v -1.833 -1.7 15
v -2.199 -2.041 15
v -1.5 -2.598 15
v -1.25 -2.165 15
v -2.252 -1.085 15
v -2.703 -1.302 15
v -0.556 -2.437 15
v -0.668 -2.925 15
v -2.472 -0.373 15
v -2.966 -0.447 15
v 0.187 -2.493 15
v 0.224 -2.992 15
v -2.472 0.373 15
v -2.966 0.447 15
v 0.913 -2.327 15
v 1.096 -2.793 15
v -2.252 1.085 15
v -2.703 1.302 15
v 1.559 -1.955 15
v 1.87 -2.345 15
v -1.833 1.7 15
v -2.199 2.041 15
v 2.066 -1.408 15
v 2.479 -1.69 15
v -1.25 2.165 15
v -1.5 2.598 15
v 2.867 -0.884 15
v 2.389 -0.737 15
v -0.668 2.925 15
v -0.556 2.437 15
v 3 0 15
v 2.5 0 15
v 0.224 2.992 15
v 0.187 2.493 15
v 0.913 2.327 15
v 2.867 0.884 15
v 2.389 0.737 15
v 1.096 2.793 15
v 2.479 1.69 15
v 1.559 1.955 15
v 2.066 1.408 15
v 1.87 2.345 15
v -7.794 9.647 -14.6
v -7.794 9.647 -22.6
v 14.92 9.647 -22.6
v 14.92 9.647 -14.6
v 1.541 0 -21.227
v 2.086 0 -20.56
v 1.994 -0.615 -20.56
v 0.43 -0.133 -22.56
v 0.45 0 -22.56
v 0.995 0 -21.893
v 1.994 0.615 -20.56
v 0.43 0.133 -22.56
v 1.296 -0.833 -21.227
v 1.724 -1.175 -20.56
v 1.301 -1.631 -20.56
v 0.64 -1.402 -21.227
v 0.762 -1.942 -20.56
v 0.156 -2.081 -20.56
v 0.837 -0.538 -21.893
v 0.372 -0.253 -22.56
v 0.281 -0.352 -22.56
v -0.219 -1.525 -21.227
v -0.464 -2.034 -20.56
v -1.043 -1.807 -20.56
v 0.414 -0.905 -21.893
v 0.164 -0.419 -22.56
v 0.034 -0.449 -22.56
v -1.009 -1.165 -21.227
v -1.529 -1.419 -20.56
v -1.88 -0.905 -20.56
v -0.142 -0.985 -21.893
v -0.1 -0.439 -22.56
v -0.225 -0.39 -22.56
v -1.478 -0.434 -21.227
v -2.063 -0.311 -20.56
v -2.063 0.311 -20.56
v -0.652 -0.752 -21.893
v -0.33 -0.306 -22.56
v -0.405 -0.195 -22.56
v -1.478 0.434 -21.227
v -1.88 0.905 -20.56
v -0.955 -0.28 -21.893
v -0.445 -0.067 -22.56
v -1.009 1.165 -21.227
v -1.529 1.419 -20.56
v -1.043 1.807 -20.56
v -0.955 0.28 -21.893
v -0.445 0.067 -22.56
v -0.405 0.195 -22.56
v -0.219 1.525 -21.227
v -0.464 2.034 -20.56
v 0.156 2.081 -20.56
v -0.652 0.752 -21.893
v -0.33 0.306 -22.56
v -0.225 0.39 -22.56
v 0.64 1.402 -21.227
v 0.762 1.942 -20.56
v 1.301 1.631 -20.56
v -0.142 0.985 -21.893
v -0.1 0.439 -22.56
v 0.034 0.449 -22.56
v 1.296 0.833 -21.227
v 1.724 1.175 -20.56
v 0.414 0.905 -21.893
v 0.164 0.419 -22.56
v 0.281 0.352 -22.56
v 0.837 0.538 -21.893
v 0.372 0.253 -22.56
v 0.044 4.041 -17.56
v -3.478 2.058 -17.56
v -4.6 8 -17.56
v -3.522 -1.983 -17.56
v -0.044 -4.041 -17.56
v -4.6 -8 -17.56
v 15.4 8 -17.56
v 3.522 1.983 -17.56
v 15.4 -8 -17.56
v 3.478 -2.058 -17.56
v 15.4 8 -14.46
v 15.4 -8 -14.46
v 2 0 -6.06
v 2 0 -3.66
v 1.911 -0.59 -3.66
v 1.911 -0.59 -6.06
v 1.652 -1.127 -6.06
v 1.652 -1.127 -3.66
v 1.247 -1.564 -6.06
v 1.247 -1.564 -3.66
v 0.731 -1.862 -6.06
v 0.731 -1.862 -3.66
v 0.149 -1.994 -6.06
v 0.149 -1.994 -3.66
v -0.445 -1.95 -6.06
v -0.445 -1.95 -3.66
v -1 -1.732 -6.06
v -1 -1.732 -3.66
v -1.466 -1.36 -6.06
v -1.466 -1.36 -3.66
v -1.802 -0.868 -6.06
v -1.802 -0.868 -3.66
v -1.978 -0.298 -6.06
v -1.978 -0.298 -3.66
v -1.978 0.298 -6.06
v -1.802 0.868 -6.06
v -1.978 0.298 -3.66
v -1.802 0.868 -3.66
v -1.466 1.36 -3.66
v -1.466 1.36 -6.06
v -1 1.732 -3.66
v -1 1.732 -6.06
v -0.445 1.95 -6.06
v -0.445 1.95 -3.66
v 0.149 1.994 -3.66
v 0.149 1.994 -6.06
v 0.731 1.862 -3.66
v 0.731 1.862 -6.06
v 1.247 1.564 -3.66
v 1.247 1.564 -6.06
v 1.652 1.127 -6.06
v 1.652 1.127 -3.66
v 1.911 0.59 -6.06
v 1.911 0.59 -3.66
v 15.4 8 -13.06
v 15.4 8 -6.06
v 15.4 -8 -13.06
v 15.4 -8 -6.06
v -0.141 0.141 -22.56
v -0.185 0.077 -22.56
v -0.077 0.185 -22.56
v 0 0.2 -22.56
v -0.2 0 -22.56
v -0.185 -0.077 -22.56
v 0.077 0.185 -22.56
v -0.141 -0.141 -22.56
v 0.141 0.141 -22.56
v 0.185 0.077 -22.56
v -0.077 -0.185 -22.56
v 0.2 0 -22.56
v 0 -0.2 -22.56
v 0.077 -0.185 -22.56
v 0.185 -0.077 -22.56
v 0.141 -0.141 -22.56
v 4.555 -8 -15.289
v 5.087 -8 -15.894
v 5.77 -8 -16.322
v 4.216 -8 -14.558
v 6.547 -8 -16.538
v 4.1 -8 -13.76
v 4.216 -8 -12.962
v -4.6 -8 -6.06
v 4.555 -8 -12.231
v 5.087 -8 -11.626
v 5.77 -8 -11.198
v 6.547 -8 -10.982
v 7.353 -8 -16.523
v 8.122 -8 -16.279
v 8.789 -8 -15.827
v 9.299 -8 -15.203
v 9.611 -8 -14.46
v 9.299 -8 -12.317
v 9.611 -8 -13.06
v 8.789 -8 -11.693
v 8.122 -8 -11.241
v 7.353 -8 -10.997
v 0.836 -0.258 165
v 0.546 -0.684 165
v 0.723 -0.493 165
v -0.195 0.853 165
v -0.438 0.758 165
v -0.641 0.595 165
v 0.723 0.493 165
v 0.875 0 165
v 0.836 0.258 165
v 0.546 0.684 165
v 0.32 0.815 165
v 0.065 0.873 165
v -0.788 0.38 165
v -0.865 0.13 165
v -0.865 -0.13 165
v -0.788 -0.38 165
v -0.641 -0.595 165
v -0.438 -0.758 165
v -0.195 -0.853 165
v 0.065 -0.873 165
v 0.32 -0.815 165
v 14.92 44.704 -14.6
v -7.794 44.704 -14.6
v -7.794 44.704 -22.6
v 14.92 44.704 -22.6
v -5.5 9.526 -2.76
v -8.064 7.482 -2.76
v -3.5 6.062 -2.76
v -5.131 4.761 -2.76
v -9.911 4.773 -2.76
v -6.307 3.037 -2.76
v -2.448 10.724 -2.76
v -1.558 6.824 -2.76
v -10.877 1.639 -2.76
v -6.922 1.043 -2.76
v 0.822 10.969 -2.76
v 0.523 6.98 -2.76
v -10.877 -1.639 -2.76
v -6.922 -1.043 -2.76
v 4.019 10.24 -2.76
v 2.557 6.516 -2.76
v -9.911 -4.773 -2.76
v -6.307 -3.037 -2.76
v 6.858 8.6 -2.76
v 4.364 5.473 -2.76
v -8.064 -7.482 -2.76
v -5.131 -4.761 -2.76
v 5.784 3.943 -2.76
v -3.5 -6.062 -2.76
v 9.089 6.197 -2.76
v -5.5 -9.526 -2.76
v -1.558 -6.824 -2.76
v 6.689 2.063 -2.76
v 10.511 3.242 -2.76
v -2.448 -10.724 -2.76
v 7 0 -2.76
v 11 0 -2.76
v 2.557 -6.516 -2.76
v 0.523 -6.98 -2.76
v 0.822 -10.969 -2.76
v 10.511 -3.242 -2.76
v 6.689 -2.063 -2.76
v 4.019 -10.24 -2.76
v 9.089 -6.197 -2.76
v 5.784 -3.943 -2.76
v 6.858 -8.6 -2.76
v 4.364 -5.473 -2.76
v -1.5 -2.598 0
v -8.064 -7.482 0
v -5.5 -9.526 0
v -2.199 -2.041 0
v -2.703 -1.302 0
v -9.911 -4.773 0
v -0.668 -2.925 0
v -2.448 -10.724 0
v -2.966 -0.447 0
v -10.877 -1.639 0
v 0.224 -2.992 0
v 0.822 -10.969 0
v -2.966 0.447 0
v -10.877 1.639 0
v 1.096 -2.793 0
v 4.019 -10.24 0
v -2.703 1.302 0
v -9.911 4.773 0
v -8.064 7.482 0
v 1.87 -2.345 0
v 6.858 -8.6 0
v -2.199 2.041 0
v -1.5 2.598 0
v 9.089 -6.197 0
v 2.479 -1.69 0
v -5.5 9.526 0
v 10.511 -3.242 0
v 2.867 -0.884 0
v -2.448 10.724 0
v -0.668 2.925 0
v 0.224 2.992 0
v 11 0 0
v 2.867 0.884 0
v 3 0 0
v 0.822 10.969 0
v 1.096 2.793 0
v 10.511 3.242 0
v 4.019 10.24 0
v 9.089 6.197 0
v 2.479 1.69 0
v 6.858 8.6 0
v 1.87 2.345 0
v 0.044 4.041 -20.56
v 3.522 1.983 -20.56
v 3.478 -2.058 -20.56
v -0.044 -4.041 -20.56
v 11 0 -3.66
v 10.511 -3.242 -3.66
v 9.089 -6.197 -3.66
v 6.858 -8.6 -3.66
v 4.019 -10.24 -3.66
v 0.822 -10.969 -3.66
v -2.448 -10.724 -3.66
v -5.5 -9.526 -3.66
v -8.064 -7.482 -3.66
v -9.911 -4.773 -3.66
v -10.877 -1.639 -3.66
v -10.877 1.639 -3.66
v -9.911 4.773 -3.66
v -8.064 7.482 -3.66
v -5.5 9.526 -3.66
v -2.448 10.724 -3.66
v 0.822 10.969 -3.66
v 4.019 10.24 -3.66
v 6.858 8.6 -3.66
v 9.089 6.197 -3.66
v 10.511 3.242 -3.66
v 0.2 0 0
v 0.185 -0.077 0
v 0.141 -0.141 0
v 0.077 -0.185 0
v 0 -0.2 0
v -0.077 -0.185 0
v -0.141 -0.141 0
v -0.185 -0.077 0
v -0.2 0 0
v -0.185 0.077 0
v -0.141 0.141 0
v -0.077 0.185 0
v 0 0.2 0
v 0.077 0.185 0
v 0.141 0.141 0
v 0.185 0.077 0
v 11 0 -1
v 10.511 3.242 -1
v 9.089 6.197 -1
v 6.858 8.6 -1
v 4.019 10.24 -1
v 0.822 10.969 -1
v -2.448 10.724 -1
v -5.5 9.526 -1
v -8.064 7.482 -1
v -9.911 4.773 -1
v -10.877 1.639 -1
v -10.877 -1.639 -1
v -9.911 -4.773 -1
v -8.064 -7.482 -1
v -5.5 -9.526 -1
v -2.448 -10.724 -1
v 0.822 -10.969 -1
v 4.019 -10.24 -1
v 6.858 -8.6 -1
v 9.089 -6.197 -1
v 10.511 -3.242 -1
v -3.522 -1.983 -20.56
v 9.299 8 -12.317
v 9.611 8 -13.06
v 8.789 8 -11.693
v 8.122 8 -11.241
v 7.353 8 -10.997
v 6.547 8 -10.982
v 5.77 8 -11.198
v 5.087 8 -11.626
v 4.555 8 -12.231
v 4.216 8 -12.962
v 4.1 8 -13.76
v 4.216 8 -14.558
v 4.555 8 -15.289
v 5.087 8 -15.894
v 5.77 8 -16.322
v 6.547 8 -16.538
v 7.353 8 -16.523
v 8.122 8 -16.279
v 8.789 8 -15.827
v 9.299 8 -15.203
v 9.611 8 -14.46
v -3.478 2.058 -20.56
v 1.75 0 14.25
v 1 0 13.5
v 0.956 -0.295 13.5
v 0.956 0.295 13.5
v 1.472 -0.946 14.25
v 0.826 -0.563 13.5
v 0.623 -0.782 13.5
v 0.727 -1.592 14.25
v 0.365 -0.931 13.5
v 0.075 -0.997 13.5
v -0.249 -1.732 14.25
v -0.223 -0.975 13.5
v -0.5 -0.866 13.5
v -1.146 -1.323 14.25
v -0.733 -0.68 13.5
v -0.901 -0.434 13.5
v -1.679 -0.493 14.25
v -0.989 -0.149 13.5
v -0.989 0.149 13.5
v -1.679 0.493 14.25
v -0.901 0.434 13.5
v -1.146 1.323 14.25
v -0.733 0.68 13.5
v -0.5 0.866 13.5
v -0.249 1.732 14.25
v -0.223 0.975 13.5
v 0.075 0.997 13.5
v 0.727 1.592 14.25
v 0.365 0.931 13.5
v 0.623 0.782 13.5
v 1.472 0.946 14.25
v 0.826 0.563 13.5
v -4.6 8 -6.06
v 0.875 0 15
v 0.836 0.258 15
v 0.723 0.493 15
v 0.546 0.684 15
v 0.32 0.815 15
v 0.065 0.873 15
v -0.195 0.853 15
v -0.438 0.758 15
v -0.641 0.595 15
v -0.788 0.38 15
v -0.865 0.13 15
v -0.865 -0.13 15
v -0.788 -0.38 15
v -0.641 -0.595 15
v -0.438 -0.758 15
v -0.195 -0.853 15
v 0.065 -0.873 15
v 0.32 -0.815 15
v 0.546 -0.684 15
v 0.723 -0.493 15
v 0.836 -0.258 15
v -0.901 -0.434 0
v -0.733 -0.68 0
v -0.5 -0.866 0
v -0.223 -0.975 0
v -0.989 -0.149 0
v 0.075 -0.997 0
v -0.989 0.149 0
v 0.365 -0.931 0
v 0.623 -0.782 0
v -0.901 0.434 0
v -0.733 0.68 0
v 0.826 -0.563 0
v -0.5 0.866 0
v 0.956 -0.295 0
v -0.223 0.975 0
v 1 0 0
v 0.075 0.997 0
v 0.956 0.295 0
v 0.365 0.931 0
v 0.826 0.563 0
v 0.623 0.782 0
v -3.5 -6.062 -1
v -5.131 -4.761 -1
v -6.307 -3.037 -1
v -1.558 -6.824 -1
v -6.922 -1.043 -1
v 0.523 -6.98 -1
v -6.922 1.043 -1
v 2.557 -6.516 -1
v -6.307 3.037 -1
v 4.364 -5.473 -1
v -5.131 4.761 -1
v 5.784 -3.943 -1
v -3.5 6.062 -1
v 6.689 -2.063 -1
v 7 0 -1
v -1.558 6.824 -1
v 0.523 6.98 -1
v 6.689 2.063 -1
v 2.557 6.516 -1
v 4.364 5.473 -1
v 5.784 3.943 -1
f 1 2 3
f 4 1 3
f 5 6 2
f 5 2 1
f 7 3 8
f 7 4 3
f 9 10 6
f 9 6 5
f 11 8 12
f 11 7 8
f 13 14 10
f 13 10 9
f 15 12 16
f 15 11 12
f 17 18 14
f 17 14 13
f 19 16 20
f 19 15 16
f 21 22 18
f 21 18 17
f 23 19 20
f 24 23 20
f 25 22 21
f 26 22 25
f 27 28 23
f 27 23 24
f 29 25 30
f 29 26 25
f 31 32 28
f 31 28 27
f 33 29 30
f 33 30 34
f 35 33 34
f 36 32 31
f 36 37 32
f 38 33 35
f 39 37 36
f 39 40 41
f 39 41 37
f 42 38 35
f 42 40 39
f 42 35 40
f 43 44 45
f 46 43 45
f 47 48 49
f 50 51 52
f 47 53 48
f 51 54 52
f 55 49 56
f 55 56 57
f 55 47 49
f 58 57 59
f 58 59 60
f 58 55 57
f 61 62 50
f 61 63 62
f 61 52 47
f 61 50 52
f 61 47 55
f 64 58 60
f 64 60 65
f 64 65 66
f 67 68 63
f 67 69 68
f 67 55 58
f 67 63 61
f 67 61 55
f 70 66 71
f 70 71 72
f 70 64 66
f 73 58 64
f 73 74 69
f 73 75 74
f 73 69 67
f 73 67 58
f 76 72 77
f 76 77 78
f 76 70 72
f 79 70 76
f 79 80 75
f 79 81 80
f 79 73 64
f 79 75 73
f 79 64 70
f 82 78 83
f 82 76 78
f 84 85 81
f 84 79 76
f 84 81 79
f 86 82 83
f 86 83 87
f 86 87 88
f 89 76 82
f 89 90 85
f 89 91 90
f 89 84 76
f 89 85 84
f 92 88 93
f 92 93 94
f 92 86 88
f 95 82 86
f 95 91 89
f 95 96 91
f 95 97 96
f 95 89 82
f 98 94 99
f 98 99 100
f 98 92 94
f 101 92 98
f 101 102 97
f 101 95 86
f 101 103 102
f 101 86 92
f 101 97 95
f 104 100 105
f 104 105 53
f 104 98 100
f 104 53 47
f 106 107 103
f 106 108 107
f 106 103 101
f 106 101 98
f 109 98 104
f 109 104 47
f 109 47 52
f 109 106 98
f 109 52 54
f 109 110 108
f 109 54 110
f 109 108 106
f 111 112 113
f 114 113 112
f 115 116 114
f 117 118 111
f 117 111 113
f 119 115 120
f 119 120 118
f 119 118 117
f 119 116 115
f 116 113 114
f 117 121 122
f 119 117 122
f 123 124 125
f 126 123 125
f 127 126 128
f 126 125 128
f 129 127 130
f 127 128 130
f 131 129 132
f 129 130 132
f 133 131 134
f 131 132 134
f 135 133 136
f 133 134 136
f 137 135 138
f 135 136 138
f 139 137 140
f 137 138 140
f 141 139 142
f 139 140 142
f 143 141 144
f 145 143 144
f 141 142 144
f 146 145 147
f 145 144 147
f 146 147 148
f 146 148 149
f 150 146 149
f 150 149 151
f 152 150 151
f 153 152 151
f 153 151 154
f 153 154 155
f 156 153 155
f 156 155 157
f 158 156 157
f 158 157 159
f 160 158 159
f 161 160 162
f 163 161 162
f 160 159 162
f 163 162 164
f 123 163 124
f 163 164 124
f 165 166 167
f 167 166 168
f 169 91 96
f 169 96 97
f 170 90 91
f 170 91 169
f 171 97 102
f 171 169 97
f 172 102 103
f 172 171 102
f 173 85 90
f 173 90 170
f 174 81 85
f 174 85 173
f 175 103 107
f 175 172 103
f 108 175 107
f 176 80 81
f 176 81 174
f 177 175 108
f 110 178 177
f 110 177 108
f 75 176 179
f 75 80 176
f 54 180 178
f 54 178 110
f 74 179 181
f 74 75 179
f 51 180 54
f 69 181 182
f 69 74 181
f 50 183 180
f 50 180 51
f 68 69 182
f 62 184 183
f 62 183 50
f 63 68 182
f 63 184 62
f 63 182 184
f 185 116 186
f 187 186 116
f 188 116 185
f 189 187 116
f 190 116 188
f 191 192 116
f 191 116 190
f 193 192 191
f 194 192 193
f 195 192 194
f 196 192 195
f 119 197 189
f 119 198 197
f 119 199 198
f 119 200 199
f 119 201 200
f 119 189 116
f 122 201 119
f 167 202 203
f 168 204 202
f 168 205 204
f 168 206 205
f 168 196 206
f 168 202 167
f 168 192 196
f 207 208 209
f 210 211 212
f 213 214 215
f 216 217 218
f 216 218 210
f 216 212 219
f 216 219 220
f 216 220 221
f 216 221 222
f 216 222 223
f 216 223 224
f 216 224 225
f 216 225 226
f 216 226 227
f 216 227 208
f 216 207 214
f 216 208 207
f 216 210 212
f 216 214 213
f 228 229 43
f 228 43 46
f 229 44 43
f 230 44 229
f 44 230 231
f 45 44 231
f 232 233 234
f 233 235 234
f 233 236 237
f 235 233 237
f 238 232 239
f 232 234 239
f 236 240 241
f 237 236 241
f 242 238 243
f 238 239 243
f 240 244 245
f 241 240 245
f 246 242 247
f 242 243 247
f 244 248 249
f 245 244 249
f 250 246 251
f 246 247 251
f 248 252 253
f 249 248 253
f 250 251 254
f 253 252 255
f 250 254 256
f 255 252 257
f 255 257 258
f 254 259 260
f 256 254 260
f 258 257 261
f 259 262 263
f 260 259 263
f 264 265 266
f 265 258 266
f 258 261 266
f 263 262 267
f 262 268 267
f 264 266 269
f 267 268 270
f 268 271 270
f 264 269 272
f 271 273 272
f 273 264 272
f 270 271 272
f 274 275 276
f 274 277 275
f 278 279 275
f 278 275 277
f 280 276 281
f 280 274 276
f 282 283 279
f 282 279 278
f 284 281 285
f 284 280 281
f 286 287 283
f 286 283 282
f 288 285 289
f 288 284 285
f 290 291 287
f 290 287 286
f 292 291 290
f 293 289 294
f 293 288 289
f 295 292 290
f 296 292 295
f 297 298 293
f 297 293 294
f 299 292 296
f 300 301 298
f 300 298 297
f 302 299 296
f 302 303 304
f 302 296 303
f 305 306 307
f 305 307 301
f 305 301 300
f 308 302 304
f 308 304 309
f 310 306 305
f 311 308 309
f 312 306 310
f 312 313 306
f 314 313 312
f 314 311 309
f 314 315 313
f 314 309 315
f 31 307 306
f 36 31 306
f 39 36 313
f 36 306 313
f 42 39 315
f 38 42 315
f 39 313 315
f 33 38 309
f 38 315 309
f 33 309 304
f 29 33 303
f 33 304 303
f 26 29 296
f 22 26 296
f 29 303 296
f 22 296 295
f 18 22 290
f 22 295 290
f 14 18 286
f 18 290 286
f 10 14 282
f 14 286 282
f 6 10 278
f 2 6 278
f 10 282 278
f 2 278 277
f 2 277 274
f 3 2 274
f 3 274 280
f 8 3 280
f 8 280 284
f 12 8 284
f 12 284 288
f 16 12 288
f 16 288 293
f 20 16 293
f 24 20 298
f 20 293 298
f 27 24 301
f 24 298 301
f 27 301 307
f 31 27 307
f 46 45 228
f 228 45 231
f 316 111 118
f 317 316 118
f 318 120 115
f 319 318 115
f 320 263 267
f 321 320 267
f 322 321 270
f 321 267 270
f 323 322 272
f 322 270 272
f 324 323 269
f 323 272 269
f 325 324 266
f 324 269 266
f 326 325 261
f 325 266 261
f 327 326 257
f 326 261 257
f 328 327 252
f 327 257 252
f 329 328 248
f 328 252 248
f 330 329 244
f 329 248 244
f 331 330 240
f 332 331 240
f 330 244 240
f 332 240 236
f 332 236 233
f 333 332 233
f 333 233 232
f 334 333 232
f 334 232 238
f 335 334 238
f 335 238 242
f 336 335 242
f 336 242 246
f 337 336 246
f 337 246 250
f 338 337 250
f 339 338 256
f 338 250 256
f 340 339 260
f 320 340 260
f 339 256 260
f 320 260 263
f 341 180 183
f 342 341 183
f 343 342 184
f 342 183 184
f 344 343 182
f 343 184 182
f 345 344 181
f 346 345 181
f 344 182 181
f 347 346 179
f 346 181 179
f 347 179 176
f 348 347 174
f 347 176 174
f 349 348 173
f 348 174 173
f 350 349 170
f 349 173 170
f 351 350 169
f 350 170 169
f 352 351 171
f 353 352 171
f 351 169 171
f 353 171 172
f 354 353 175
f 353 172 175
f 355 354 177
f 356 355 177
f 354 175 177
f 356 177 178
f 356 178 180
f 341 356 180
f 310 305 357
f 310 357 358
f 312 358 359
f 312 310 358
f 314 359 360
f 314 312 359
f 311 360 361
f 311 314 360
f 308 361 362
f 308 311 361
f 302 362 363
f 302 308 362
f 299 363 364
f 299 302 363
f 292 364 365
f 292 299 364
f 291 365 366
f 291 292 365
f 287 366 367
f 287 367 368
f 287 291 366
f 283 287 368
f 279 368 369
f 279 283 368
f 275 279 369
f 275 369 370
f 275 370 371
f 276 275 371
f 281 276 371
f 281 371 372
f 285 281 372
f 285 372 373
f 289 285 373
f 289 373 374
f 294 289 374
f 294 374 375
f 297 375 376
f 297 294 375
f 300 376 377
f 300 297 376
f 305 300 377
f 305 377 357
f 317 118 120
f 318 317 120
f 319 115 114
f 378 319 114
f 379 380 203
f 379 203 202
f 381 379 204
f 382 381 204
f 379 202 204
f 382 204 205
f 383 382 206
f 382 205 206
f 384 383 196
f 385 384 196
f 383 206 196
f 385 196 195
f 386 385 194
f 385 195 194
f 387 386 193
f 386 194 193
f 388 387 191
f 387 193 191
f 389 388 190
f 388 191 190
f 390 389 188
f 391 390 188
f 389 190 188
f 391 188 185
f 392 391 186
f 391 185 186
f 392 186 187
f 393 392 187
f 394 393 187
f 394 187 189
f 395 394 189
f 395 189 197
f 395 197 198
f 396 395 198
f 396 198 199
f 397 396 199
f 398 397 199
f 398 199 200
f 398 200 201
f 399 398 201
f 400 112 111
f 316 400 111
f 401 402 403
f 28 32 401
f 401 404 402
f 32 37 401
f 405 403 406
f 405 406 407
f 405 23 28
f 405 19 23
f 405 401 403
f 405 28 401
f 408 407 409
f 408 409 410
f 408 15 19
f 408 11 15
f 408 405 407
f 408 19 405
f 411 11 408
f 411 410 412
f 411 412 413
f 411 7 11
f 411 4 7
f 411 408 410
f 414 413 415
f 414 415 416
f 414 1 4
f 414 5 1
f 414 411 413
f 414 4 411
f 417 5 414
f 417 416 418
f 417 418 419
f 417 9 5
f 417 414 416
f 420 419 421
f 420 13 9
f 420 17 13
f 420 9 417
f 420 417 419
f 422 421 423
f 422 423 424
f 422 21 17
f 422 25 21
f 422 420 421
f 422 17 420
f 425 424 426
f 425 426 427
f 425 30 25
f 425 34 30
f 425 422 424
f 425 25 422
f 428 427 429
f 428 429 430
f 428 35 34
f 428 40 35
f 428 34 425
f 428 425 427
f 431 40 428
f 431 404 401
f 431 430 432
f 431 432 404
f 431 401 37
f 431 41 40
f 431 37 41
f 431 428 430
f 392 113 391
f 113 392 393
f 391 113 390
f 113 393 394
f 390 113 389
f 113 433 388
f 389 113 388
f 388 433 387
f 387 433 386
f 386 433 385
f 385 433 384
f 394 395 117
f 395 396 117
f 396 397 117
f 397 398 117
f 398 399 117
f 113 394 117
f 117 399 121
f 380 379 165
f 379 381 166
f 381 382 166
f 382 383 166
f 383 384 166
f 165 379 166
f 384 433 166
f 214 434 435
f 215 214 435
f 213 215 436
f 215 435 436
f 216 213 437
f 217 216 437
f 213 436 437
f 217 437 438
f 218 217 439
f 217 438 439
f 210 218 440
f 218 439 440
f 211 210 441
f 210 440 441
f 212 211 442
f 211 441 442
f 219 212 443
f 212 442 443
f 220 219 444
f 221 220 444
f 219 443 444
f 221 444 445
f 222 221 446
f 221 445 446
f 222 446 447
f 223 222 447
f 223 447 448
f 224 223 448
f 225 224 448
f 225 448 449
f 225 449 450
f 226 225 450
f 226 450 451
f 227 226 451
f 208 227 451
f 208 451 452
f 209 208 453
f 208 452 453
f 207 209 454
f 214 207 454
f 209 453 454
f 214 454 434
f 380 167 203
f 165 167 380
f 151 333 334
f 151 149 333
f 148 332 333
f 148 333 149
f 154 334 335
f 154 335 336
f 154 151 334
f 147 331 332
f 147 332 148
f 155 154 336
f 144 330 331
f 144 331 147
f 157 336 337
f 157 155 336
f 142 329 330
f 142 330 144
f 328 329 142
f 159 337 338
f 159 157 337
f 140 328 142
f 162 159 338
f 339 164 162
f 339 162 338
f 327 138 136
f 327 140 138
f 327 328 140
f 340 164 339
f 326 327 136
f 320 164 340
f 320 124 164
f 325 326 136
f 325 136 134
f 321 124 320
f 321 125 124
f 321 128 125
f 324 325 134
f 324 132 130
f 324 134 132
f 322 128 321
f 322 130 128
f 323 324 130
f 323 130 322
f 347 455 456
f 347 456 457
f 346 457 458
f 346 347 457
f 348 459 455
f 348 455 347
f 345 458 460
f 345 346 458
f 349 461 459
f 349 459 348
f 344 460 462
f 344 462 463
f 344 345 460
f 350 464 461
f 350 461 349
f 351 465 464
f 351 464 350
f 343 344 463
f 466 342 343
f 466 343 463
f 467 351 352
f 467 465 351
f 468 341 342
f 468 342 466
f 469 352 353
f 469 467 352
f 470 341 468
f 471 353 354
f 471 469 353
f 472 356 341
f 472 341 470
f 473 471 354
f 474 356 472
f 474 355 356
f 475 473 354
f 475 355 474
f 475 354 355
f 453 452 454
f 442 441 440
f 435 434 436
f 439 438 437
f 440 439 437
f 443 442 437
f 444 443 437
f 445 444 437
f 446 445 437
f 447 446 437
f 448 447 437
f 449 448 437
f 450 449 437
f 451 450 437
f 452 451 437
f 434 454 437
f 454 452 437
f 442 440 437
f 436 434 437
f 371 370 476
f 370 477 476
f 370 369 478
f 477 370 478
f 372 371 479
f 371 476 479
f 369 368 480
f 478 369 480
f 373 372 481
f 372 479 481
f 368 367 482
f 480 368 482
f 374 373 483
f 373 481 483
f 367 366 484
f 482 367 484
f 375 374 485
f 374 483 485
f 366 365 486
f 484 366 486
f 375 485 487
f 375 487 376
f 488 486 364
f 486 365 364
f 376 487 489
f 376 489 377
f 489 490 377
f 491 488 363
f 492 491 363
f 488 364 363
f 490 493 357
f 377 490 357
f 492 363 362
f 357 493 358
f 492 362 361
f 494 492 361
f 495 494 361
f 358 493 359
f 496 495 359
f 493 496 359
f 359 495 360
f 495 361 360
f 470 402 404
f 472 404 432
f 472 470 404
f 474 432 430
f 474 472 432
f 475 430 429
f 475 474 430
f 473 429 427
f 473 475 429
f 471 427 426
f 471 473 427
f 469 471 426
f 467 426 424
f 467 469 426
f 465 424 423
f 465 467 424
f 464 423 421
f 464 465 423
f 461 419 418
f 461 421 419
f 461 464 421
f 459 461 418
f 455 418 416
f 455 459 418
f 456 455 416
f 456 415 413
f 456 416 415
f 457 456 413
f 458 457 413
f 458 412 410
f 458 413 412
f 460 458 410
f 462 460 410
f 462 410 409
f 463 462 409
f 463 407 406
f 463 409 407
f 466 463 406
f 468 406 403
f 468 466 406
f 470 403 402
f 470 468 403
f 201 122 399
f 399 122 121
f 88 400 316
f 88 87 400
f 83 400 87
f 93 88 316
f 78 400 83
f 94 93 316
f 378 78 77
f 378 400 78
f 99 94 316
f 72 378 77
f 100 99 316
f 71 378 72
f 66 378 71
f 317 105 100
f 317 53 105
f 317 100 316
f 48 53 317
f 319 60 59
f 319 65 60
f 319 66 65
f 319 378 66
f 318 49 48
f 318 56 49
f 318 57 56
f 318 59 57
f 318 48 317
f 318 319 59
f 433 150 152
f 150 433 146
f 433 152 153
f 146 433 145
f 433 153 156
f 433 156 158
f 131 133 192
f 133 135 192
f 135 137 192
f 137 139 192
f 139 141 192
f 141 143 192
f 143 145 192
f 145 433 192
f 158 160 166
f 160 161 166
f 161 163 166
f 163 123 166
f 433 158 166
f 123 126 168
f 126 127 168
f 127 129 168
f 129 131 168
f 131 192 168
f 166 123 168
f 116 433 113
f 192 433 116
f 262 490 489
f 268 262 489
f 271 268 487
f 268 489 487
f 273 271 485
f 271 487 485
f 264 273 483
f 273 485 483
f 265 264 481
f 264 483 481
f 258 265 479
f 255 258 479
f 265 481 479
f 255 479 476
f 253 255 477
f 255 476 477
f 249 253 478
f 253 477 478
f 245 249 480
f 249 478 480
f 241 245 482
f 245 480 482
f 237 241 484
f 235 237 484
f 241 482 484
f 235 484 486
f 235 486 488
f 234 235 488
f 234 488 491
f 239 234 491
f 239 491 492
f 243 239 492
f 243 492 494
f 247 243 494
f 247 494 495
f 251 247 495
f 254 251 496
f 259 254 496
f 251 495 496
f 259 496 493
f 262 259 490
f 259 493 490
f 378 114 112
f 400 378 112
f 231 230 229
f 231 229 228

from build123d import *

# Parameters (mm, degrees)
F0_R      = 11
F1_DEPTH  = 1
F2_R      = 7
F3_DEPTH  = 1.76
F4_R      = 11
F5_DEPTH  = 0.9
F6_R      = 2
F7_DEPTH  = 2.4
F8_W      = 20
F8_H      = 16
F9_DEPTH  = 11.5
F10_R     = 2.8
F11_DEPTH = 19.001
F12_W     = 16
F12_H     = 1.4
F13_DEPTH = 5.7899116577
F15_DEPTH = 3
F16_R     = 2.25
F17_DEPTH = 2
F19_R     = 3
F20_DEPTH = 15
F21_R     = 0.2
F22_DEPTH = 37.561
F23_R     = 1
F24_DEPTH = 15.001
F25_SIZE  = 1.5
F27_W     = 22.7133790031
F27_H     = 35.0576061755
F28_DEPTH = 8
F30_R     = 0.875
F31_DEPTH = 150


# Not quite as in the source:
# - a fillet or chamfer that OpenCascade refuses, or shapes differently, is made with other operations: its cross-section is extruded or revolved along the edge and cut away or added


with BuildPart() as f1:
    # F0 (on Top) → F1 (new body)
    with BuildSketch(Plane.XY):
        Circle(F0_R)
    extrude(amount=-F1_DEPTH)

    # F2 (on face) → F3 (join)
    with BuildSketch(Plane(origin=(0, 0, -1), x_dir=(1, 0, 0), z_dir=(0, 0, -1))):
        Circle(F2_R)
    extrude(amount=F3_DEPTH)

    # F4 (on face) → F5 (join)
    with BuildSketch(Plane(origin=(0, 0, -2.76), x_dir=(1, 0, 0), z_dir=(0, 0, -1))):
        Circle(F4_R)
    extrude(amount=F5_DEPTH)

    # F6 (on face) → F7 (join)
    with BuildSketch(Plane(origin=(0, 0, -3.66), x_dir=(1, 0, 0), z_dir=(0, 0, -1))):
        Circle(F6_R)
    extrude(amount=F7_DEPTH)

    # F8 (on face) → F9 (join)
    with BuildSketch(Plane(origin=(0, 0, -6.06), x_dir=(1, 0, 0), z_dir=(0, 0, -1))):
        with Locations((5.4, 0)):
            Rectangle(F8_W, F8_H)
    extrude(amount=F9_DEPTH)

    # F10 (on face) → F11 (cut, through all)
    with BuildSketch(Plane.XZ.offset(8)):
        with Locations((6.9, -13.76)):
            Circle(F10_R)
    extrude(amount=-F11_DEPTH, mode=Mode.SUBTRACT)

    # F12 (on face) → F13 (cut, through all)
    with BuildSketch(Plane.YZ.offset(15.4)):
        with Locations((0, -13.76)):
            Rectangle(F12_W, F12_H)
    extrude(amount=-F13_DEPTH, mode=Mode.SUBTRACT)

    # F14 (on face) → F15 (join)
    with BuildSketch(Plane(origin=(0, 0, -17.56), x_dir=(1, 0, 0), z_dir=(0, 0, -1))):
        Polygon((0.0435586886, -4.0414518843), (3.5217793443, -1.9830030113), (3.4782206557, 2.058448873), (-0.0435586886, 4.0414518843), (-3.5217793443, 1.9830030113), (-3.4782206557, -2.058448873), align=None)
    extrude(amount=F15_DEPTH)

    # F16 (on face) → F17 (join)
    with BuildSketch(Plane(origin=(0, 0, -20.56), x_dir=(1, 0, 0), z_dir=(0, 0, -1))):
        Circle(F16_R)
    extrude(amount=F17_DEPTH)

    # F18: chamfer of 1.8 x 2.2 on 1 edges, made by hand


with BuildPart() as f18_tool2:
    # F18_s3 → F18_t4 (revolve)
    with BuildSketch(Plane.XZ):
        Polygon((2.25, -20.36), (0.45, -22.56), (2.25, -22.56), align=None)
    revolve(axis=Axis((0, 0, -22.56), (0, 0, -1)))

    split(bisect_by=Plane.XY.offset(-20.56), keep=Keep.BOTTOM)


with BuildPart() as f1_1:
    add(f1.part)

    # F18_t1: cut F18_tool2
    add(f18_tool2.part, mode=Mode.SUBTRACT)

    # F19 (on face) → F20 (join)
    with BuildSketch(Plane.XY):
        Circle(F19_R)
    extrude(amount=F20_DEPTH)

    # F21 (on face) → F22 (cut, through all)
    with BuildSketch(Plane(origin=(0, 0, -22.56), x_dir=(1, 0, 0), z_dir=(0, 0, -1))):
        Circle(F21_R)
    extrude(amount=-F22_DEPTH, mode=Mode.SUBTRACT)

    # F23 (on face) → F24 (cut, through all)
    with BuildSketch(Plane.XY):
        Circle(F23_R)
    extrude(amount=F24_DEPTH, mode=Mode.SUBTRACT)

    # F25
    f25_edges = [f1_1.edges().sort_by_distance(p)[0] for p in [
        (-1, 0, 15),
    ]]
    chamfer(f25_edges, length=F25_SIZE)


with BuildPart() as f28:
    # F27 (on offset) → F28 (new body)
    with BuildSketch(Plane.XY.offset(-22.6)):
        with Locations((3.563052509, 27.1755484864)):
            Rectangle(F27_W, F27_H)
    extrude(amount=F28_DEPTH)


with BuildPart() as f31:
    # F30 (on offset) → F31 (new body)
    with BuildSketch(Plane.XY.offset(15)):
        Circle(F30_R)
    extrude(amount=F31_DEPTH)


solid = Compound([f1_1.part, f28.part, f31.part])
